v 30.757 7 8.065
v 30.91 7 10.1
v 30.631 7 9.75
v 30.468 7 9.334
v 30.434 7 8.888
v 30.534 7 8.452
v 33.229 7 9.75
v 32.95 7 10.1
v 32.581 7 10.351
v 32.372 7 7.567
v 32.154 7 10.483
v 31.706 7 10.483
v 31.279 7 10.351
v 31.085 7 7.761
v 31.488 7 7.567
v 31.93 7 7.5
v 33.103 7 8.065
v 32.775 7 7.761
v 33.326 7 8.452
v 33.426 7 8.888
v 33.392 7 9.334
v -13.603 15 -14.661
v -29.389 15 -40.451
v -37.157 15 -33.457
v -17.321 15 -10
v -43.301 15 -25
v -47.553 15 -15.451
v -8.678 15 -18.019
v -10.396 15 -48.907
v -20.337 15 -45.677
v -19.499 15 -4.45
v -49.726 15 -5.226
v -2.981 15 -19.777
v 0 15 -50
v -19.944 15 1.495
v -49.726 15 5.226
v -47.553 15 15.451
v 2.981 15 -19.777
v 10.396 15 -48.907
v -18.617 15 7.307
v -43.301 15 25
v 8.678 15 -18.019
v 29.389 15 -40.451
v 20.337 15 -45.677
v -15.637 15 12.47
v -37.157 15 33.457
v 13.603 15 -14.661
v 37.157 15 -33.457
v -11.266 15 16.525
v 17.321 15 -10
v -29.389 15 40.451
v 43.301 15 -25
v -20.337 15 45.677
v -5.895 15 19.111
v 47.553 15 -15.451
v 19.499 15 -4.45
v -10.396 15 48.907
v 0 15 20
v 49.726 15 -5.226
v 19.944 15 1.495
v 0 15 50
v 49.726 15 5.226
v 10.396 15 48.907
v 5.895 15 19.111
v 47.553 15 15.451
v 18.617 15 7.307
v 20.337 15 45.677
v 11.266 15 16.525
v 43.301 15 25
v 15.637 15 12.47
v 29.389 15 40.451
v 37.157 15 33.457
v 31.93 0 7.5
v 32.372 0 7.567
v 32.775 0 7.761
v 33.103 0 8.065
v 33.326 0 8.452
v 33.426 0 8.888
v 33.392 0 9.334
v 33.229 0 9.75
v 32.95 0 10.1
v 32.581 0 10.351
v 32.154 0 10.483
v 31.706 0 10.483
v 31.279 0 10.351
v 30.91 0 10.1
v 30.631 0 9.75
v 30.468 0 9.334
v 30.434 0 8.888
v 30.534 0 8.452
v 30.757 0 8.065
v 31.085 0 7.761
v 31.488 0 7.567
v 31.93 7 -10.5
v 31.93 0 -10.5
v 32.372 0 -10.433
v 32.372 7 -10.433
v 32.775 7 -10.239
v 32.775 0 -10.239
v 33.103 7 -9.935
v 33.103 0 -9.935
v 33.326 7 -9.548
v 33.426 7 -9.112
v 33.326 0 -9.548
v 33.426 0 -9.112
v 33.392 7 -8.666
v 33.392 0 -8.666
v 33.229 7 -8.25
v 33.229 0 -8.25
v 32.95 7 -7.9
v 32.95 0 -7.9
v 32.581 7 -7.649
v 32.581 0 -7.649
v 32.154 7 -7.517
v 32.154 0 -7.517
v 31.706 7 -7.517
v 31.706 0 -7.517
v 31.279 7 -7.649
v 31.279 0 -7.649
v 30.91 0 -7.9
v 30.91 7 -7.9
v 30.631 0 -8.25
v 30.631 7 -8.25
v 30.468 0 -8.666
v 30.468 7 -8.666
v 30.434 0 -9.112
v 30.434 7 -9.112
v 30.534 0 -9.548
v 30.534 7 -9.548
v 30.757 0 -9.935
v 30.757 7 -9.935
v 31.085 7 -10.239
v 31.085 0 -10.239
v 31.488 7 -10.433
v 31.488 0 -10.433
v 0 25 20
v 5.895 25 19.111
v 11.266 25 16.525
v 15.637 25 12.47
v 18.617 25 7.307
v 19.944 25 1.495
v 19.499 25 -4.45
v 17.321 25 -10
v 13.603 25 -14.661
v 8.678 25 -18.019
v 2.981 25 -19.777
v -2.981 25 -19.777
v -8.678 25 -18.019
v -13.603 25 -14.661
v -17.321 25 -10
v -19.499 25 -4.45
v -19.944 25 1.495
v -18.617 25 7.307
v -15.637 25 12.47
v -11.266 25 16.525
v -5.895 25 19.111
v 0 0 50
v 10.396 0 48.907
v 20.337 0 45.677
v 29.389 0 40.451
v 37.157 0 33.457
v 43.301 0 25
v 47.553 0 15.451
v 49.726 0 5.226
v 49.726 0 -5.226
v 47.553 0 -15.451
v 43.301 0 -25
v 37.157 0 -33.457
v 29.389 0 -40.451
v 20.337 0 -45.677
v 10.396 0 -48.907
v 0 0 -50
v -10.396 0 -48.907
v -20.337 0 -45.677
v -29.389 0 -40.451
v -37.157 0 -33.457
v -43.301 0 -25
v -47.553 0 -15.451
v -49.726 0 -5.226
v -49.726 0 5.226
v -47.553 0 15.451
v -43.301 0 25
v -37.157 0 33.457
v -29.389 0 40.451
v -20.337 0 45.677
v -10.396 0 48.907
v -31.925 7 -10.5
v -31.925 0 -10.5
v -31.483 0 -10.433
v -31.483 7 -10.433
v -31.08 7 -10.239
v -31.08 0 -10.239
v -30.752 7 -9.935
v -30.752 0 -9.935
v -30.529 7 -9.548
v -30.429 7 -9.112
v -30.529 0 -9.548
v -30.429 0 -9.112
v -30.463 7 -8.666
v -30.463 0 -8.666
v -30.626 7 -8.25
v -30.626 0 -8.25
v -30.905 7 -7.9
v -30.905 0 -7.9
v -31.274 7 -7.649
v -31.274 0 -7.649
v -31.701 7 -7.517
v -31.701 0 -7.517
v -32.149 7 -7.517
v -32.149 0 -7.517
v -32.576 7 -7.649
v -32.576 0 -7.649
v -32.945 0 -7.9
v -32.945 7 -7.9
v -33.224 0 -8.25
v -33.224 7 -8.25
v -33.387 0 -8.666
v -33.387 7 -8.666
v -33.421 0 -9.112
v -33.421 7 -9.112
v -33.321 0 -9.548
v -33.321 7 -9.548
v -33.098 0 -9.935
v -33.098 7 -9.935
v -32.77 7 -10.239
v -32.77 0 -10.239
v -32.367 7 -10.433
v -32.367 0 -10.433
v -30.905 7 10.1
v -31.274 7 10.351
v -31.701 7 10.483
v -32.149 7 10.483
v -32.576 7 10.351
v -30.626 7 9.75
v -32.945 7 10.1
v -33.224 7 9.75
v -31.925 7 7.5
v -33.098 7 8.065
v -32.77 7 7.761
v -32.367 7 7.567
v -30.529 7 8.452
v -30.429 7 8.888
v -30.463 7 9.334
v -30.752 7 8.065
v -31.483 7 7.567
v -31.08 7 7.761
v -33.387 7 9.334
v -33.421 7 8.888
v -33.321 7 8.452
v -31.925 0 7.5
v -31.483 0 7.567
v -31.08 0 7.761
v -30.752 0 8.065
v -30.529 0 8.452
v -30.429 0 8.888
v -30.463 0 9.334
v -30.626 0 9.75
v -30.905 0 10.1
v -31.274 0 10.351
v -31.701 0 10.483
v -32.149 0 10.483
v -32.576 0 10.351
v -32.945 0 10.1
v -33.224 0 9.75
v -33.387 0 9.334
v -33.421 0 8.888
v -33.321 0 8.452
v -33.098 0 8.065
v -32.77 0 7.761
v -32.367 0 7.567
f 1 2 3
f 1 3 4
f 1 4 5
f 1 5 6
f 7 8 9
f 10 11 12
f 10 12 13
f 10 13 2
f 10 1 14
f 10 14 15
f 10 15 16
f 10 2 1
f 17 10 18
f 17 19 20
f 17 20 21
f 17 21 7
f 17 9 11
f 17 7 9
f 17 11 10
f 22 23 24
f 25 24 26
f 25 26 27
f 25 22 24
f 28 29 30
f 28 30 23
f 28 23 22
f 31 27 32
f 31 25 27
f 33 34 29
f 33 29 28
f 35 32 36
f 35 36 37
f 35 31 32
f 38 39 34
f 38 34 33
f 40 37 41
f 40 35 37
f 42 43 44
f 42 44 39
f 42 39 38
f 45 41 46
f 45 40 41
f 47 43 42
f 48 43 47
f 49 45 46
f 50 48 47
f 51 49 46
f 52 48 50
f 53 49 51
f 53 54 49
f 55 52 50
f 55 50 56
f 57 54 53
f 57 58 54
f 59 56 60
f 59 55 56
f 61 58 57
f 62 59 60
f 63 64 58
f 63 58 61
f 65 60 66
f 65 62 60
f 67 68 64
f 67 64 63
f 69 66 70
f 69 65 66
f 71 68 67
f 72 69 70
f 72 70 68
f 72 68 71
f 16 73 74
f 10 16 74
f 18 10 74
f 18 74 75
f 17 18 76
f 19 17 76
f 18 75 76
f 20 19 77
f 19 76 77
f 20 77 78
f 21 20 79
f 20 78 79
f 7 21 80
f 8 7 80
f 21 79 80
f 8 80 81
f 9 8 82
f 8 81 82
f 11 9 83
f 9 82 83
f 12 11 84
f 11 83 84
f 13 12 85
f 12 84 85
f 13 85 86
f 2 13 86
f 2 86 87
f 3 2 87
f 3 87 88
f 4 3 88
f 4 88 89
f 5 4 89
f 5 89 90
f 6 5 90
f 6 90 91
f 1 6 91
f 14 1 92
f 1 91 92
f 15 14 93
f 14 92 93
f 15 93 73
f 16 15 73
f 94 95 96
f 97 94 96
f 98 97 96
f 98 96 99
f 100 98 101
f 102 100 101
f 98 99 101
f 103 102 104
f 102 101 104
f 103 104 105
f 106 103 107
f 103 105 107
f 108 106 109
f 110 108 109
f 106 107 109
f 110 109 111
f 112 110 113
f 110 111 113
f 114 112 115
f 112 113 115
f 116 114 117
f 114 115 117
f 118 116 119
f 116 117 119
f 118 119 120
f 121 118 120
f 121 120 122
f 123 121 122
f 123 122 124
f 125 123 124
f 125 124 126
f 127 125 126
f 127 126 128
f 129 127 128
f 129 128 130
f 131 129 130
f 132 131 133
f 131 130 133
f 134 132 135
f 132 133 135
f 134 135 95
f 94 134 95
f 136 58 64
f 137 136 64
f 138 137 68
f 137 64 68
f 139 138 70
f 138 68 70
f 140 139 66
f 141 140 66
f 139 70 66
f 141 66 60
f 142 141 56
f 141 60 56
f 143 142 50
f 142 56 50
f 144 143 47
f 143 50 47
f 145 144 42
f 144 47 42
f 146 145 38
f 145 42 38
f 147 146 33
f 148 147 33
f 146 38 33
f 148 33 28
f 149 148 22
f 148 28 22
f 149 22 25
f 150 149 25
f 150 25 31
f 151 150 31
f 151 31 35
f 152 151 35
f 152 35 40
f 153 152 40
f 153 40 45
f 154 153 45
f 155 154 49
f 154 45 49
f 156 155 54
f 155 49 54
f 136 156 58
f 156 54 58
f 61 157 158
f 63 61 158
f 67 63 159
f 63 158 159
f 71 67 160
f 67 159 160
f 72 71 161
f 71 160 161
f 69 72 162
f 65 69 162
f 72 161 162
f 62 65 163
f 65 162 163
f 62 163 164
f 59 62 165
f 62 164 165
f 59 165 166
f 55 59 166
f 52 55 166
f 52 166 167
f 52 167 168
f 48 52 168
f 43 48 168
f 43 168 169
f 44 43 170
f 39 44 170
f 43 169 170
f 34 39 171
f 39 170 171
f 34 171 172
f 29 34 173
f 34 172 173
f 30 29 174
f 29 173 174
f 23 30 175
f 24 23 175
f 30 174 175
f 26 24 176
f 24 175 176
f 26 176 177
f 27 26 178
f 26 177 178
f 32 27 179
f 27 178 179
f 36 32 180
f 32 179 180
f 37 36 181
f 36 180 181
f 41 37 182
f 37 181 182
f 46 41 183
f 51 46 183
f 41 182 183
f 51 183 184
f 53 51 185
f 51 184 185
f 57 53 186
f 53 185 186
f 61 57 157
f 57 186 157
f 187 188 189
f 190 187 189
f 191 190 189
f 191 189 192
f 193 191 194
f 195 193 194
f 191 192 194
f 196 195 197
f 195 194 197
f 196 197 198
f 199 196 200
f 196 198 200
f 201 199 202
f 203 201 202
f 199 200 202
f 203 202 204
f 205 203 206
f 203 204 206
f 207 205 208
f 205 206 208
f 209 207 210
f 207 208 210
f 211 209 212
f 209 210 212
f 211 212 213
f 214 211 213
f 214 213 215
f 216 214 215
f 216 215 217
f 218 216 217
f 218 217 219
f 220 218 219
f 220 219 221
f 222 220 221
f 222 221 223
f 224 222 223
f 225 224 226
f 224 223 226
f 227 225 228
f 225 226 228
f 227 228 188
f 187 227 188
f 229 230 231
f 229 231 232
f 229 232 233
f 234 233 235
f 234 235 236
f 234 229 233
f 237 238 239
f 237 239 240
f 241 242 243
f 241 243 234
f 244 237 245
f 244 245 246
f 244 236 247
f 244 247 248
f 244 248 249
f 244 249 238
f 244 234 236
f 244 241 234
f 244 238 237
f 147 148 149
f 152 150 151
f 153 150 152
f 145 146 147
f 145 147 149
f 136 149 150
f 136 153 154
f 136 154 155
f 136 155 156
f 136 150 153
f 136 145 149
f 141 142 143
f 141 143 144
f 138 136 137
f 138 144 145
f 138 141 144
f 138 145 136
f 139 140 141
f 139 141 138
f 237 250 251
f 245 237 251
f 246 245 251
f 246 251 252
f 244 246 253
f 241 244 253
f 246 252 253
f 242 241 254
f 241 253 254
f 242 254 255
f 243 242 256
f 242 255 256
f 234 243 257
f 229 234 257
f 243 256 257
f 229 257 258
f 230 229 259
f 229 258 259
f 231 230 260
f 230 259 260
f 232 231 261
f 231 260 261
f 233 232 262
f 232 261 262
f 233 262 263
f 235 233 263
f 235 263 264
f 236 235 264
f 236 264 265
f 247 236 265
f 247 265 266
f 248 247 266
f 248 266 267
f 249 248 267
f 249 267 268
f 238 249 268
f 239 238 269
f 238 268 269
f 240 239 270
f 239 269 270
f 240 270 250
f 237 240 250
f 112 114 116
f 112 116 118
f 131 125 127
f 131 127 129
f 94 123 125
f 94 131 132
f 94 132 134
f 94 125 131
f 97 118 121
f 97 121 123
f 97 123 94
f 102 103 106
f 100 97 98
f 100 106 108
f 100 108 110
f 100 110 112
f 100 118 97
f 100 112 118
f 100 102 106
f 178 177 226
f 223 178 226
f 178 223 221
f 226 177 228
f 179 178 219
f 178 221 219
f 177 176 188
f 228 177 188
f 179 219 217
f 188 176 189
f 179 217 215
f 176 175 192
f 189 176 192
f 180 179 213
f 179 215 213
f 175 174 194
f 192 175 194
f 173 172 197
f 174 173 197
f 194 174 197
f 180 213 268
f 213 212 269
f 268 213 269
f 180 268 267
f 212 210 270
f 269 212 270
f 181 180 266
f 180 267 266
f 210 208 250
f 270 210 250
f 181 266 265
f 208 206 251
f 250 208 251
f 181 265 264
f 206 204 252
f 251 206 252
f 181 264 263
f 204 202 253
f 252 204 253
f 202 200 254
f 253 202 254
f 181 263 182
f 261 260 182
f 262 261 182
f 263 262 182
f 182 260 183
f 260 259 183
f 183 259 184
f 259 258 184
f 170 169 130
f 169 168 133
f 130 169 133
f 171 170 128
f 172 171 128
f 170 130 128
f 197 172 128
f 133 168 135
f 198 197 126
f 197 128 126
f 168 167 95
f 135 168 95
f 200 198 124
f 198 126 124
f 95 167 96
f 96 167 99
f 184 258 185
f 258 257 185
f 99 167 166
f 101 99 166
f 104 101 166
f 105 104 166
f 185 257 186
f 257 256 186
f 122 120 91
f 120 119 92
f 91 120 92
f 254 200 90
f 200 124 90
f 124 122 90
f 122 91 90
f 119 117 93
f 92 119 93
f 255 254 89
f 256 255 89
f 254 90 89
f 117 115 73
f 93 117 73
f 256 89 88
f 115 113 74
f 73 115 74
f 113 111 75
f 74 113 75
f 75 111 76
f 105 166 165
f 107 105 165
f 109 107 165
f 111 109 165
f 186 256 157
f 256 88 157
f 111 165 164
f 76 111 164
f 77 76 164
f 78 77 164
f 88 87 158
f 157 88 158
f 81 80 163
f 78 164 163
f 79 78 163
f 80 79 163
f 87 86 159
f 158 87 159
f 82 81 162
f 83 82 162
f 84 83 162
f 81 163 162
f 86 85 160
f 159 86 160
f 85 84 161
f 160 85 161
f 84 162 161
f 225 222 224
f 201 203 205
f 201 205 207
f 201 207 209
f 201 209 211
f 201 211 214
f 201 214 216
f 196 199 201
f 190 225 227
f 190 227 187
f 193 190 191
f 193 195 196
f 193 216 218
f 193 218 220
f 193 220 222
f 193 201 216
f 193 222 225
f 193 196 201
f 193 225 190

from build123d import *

# Parameters (mm, degrees)
SKETCH_2_R          = 50
EXTRUDE_1_DEPTH     = 15
SKETCH_5_R          = 20
EXTRUDE_2_DEPTH     = 10
SKETCH_6_R          = 1.5
CUT_EXTRUDE_1_DEPTH = 7


with BuildPart() as part:
    # Эскиз2 → Бобышка-Вытянуть1 (new body)
    with BuildSketch(Plane(origin=(0, 0, 0), x_dir=(1, 0, 0), z_dir=(0, 1, 0))):
        with Locations(Location((0, 0, 0), (0, 0, 270))):
            Circle(SKETCH_2_R)
    extrude(amount=EXTRUDE_1_DEPTH)

    # Эскиз5 → Бобышка-Вытянуть2 (add)
    with BuildSketch(Plane(origin=(0, 15, 0), x_dir=(1, 0, 0), z_dir=(0, 1, 0))):
        with Locations(Location((0, 0, 0), (0, 0, 270))):
            Circle(SKETCH_5_R)
    extrude(amount=EXTRUDE_2_DEPTH)

    # Эскиз6 → Вырез-Вытянуть1 (cut)
    with BuildSketch(Plane.XZ):
        with Locations(Location((31.93, 9, 0), (0, 0, 270))):
            Circle(SKETCH_6_R)
        with Locations(Location((31.93, -9, 0), (0, 0, 270))):
            Circle(SKETCH_6_R)
        with Locations(Location((-31.925, 9, 0), (0, 0, 270))):
            Circle(SKETCH_6_R)
        with Locations(Location((-31.925, -9, 0), (0, 0, 270))):
            Circle(SKETCH_6_R)
    extrude(amount=-CUT_EXTRUDE_1_DEPTH, mode=Mode.SUBTRACT)


solid = part.part
